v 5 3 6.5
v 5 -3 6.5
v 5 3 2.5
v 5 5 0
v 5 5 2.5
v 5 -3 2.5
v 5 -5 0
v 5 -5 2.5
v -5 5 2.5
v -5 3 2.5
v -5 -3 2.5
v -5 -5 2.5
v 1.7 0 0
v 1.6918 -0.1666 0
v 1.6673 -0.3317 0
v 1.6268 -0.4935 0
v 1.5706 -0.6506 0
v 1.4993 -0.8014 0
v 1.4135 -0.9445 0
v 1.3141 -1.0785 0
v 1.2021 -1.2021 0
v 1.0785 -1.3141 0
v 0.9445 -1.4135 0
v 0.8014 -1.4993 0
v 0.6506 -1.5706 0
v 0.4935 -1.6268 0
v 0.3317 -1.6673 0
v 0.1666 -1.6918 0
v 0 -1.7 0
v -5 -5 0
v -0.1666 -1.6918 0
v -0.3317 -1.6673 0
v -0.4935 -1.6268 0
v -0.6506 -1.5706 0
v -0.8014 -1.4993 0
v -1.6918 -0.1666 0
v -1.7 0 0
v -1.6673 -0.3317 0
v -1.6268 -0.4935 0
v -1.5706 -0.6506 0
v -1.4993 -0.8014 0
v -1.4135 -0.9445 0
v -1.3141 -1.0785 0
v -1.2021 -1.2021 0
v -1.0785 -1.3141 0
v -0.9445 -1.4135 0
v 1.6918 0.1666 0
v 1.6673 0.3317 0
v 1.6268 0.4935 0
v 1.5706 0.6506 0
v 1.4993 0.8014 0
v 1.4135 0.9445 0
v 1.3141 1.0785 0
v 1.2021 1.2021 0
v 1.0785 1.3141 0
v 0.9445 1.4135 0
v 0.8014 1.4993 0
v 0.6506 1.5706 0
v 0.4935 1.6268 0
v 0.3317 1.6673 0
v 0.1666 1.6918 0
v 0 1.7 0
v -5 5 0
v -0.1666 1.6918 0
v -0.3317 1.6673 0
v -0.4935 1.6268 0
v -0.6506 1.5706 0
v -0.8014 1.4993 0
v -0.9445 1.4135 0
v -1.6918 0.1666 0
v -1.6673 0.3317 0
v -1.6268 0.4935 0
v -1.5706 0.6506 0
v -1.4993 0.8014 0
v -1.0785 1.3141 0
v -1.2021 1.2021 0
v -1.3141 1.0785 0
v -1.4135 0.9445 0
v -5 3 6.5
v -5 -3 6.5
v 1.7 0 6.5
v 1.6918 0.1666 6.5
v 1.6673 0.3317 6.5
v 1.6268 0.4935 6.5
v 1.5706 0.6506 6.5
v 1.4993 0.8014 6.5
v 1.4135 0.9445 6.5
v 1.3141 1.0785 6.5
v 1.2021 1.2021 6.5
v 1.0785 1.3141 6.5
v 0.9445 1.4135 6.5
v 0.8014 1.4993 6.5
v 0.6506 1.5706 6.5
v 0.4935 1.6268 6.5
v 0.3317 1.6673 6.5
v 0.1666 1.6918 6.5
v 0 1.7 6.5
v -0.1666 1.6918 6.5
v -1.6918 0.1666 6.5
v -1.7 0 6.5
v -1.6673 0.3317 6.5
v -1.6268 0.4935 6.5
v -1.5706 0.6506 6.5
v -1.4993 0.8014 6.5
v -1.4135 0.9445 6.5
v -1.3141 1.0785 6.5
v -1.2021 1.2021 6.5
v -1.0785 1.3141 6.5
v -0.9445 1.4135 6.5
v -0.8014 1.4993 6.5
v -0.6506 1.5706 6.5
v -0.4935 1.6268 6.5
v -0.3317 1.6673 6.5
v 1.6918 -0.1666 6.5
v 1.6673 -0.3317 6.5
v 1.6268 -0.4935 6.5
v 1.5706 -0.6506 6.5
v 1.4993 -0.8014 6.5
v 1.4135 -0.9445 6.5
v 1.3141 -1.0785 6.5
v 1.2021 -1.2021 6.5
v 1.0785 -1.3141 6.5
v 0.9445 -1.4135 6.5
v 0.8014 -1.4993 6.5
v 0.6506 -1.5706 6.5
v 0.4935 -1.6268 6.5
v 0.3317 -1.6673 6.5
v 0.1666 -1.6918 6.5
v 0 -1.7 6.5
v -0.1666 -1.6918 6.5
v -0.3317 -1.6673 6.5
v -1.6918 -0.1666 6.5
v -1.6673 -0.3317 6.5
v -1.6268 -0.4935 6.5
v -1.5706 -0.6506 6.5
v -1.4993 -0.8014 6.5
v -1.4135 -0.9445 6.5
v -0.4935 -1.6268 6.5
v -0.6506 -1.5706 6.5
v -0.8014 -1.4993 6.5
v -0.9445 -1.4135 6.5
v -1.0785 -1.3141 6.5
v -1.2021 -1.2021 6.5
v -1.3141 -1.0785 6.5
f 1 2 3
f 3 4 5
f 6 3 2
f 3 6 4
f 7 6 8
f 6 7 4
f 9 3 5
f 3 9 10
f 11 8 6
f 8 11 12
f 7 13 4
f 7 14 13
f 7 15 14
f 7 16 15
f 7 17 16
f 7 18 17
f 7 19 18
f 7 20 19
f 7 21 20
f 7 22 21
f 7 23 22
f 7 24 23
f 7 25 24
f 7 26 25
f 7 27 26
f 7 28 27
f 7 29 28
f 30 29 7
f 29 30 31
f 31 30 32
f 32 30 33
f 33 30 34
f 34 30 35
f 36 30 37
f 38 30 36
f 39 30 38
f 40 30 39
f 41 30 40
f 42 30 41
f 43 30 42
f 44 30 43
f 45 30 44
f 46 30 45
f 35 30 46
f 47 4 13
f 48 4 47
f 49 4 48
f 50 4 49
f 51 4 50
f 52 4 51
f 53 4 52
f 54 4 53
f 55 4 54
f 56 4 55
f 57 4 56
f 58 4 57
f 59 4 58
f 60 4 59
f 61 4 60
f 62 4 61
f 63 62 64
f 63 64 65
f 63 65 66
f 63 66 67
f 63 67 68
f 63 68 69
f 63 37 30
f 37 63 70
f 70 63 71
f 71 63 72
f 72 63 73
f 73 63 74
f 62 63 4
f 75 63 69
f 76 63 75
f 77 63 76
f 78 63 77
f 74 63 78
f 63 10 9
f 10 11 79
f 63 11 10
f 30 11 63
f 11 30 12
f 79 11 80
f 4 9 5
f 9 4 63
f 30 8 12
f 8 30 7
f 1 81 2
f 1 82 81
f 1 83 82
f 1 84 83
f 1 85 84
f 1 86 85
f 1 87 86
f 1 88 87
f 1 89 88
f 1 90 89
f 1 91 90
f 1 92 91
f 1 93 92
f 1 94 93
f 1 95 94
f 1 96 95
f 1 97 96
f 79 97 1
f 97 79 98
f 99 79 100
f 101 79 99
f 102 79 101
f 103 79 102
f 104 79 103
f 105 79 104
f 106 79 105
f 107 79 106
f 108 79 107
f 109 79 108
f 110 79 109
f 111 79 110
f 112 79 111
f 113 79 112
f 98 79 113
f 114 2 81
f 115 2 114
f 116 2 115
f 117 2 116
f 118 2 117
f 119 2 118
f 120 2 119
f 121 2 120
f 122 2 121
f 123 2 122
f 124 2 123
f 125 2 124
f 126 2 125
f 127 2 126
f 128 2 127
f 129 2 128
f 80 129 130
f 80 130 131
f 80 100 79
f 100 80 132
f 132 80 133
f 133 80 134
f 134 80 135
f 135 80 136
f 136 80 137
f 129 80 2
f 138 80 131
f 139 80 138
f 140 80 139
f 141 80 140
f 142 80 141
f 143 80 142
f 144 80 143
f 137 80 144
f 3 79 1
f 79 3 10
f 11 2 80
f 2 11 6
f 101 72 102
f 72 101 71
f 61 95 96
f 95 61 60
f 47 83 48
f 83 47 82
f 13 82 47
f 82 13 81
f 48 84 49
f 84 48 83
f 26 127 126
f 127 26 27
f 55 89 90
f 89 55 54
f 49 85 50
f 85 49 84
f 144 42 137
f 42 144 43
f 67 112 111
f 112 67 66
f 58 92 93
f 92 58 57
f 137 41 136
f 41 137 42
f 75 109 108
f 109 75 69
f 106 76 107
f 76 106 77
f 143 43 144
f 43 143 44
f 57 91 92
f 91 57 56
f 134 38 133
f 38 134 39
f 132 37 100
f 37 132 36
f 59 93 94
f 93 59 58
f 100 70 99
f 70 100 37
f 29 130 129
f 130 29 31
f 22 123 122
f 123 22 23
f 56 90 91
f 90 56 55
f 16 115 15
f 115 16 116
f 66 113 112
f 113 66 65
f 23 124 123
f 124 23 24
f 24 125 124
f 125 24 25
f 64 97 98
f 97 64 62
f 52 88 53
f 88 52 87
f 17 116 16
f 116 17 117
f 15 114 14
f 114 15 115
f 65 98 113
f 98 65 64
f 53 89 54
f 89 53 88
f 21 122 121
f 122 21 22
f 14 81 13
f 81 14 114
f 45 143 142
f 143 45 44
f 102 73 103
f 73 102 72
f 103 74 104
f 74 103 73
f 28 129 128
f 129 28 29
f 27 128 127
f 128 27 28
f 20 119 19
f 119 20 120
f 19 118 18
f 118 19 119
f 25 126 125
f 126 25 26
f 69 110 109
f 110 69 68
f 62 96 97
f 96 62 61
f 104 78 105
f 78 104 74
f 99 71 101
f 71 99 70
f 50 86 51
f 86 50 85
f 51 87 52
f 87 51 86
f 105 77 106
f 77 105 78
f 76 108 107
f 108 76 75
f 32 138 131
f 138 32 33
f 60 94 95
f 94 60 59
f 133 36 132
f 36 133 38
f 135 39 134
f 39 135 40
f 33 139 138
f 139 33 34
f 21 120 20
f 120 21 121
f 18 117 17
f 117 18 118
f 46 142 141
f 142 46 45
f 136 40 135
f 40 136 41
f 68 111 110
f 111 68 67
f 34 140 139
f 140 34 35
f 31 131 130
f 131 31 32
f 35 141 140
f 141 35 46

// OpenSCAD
// T-slot nut for aluminium extrusion
// Print orientation: flange down on XY plane, neck upward (+Z)

$fn = 64;

// ---- Dimensions (mm) ----
nut_length    = 10;    // length along X
flange_width  = 10;    // bottom flange width (Y)
flange_height = 2.5;   // flange thickness, z = 0 .. 2.5
neck_width    = 6;     // neck width (Y), centred
total_height  = 6.5;   // top of neck (z)
hole_d        = 3.4;   // vertical screw clearance hole diameter
eps           = 0.5;   // overshoot for clean boolean cuts

difference() {
    union() {
        // Bottom flange
        translate([-nut_length/2, -flange_width/2, 0])
            cube([nut_length, flange_width, flange_height]);

        // Neck (overlaps flange slightly for a clean union)
        translate([-nut_length/2, -neck_width/2, flange_height - 0.01])
            cube([nut_length, neck_width, total_height - flange_height + 0.01]);
    }

    // Vertical screw hole through the centre
    translate([0, 0, -eps])
        cylinder(d = hole_d, h = total_height + 2*eps);
}
